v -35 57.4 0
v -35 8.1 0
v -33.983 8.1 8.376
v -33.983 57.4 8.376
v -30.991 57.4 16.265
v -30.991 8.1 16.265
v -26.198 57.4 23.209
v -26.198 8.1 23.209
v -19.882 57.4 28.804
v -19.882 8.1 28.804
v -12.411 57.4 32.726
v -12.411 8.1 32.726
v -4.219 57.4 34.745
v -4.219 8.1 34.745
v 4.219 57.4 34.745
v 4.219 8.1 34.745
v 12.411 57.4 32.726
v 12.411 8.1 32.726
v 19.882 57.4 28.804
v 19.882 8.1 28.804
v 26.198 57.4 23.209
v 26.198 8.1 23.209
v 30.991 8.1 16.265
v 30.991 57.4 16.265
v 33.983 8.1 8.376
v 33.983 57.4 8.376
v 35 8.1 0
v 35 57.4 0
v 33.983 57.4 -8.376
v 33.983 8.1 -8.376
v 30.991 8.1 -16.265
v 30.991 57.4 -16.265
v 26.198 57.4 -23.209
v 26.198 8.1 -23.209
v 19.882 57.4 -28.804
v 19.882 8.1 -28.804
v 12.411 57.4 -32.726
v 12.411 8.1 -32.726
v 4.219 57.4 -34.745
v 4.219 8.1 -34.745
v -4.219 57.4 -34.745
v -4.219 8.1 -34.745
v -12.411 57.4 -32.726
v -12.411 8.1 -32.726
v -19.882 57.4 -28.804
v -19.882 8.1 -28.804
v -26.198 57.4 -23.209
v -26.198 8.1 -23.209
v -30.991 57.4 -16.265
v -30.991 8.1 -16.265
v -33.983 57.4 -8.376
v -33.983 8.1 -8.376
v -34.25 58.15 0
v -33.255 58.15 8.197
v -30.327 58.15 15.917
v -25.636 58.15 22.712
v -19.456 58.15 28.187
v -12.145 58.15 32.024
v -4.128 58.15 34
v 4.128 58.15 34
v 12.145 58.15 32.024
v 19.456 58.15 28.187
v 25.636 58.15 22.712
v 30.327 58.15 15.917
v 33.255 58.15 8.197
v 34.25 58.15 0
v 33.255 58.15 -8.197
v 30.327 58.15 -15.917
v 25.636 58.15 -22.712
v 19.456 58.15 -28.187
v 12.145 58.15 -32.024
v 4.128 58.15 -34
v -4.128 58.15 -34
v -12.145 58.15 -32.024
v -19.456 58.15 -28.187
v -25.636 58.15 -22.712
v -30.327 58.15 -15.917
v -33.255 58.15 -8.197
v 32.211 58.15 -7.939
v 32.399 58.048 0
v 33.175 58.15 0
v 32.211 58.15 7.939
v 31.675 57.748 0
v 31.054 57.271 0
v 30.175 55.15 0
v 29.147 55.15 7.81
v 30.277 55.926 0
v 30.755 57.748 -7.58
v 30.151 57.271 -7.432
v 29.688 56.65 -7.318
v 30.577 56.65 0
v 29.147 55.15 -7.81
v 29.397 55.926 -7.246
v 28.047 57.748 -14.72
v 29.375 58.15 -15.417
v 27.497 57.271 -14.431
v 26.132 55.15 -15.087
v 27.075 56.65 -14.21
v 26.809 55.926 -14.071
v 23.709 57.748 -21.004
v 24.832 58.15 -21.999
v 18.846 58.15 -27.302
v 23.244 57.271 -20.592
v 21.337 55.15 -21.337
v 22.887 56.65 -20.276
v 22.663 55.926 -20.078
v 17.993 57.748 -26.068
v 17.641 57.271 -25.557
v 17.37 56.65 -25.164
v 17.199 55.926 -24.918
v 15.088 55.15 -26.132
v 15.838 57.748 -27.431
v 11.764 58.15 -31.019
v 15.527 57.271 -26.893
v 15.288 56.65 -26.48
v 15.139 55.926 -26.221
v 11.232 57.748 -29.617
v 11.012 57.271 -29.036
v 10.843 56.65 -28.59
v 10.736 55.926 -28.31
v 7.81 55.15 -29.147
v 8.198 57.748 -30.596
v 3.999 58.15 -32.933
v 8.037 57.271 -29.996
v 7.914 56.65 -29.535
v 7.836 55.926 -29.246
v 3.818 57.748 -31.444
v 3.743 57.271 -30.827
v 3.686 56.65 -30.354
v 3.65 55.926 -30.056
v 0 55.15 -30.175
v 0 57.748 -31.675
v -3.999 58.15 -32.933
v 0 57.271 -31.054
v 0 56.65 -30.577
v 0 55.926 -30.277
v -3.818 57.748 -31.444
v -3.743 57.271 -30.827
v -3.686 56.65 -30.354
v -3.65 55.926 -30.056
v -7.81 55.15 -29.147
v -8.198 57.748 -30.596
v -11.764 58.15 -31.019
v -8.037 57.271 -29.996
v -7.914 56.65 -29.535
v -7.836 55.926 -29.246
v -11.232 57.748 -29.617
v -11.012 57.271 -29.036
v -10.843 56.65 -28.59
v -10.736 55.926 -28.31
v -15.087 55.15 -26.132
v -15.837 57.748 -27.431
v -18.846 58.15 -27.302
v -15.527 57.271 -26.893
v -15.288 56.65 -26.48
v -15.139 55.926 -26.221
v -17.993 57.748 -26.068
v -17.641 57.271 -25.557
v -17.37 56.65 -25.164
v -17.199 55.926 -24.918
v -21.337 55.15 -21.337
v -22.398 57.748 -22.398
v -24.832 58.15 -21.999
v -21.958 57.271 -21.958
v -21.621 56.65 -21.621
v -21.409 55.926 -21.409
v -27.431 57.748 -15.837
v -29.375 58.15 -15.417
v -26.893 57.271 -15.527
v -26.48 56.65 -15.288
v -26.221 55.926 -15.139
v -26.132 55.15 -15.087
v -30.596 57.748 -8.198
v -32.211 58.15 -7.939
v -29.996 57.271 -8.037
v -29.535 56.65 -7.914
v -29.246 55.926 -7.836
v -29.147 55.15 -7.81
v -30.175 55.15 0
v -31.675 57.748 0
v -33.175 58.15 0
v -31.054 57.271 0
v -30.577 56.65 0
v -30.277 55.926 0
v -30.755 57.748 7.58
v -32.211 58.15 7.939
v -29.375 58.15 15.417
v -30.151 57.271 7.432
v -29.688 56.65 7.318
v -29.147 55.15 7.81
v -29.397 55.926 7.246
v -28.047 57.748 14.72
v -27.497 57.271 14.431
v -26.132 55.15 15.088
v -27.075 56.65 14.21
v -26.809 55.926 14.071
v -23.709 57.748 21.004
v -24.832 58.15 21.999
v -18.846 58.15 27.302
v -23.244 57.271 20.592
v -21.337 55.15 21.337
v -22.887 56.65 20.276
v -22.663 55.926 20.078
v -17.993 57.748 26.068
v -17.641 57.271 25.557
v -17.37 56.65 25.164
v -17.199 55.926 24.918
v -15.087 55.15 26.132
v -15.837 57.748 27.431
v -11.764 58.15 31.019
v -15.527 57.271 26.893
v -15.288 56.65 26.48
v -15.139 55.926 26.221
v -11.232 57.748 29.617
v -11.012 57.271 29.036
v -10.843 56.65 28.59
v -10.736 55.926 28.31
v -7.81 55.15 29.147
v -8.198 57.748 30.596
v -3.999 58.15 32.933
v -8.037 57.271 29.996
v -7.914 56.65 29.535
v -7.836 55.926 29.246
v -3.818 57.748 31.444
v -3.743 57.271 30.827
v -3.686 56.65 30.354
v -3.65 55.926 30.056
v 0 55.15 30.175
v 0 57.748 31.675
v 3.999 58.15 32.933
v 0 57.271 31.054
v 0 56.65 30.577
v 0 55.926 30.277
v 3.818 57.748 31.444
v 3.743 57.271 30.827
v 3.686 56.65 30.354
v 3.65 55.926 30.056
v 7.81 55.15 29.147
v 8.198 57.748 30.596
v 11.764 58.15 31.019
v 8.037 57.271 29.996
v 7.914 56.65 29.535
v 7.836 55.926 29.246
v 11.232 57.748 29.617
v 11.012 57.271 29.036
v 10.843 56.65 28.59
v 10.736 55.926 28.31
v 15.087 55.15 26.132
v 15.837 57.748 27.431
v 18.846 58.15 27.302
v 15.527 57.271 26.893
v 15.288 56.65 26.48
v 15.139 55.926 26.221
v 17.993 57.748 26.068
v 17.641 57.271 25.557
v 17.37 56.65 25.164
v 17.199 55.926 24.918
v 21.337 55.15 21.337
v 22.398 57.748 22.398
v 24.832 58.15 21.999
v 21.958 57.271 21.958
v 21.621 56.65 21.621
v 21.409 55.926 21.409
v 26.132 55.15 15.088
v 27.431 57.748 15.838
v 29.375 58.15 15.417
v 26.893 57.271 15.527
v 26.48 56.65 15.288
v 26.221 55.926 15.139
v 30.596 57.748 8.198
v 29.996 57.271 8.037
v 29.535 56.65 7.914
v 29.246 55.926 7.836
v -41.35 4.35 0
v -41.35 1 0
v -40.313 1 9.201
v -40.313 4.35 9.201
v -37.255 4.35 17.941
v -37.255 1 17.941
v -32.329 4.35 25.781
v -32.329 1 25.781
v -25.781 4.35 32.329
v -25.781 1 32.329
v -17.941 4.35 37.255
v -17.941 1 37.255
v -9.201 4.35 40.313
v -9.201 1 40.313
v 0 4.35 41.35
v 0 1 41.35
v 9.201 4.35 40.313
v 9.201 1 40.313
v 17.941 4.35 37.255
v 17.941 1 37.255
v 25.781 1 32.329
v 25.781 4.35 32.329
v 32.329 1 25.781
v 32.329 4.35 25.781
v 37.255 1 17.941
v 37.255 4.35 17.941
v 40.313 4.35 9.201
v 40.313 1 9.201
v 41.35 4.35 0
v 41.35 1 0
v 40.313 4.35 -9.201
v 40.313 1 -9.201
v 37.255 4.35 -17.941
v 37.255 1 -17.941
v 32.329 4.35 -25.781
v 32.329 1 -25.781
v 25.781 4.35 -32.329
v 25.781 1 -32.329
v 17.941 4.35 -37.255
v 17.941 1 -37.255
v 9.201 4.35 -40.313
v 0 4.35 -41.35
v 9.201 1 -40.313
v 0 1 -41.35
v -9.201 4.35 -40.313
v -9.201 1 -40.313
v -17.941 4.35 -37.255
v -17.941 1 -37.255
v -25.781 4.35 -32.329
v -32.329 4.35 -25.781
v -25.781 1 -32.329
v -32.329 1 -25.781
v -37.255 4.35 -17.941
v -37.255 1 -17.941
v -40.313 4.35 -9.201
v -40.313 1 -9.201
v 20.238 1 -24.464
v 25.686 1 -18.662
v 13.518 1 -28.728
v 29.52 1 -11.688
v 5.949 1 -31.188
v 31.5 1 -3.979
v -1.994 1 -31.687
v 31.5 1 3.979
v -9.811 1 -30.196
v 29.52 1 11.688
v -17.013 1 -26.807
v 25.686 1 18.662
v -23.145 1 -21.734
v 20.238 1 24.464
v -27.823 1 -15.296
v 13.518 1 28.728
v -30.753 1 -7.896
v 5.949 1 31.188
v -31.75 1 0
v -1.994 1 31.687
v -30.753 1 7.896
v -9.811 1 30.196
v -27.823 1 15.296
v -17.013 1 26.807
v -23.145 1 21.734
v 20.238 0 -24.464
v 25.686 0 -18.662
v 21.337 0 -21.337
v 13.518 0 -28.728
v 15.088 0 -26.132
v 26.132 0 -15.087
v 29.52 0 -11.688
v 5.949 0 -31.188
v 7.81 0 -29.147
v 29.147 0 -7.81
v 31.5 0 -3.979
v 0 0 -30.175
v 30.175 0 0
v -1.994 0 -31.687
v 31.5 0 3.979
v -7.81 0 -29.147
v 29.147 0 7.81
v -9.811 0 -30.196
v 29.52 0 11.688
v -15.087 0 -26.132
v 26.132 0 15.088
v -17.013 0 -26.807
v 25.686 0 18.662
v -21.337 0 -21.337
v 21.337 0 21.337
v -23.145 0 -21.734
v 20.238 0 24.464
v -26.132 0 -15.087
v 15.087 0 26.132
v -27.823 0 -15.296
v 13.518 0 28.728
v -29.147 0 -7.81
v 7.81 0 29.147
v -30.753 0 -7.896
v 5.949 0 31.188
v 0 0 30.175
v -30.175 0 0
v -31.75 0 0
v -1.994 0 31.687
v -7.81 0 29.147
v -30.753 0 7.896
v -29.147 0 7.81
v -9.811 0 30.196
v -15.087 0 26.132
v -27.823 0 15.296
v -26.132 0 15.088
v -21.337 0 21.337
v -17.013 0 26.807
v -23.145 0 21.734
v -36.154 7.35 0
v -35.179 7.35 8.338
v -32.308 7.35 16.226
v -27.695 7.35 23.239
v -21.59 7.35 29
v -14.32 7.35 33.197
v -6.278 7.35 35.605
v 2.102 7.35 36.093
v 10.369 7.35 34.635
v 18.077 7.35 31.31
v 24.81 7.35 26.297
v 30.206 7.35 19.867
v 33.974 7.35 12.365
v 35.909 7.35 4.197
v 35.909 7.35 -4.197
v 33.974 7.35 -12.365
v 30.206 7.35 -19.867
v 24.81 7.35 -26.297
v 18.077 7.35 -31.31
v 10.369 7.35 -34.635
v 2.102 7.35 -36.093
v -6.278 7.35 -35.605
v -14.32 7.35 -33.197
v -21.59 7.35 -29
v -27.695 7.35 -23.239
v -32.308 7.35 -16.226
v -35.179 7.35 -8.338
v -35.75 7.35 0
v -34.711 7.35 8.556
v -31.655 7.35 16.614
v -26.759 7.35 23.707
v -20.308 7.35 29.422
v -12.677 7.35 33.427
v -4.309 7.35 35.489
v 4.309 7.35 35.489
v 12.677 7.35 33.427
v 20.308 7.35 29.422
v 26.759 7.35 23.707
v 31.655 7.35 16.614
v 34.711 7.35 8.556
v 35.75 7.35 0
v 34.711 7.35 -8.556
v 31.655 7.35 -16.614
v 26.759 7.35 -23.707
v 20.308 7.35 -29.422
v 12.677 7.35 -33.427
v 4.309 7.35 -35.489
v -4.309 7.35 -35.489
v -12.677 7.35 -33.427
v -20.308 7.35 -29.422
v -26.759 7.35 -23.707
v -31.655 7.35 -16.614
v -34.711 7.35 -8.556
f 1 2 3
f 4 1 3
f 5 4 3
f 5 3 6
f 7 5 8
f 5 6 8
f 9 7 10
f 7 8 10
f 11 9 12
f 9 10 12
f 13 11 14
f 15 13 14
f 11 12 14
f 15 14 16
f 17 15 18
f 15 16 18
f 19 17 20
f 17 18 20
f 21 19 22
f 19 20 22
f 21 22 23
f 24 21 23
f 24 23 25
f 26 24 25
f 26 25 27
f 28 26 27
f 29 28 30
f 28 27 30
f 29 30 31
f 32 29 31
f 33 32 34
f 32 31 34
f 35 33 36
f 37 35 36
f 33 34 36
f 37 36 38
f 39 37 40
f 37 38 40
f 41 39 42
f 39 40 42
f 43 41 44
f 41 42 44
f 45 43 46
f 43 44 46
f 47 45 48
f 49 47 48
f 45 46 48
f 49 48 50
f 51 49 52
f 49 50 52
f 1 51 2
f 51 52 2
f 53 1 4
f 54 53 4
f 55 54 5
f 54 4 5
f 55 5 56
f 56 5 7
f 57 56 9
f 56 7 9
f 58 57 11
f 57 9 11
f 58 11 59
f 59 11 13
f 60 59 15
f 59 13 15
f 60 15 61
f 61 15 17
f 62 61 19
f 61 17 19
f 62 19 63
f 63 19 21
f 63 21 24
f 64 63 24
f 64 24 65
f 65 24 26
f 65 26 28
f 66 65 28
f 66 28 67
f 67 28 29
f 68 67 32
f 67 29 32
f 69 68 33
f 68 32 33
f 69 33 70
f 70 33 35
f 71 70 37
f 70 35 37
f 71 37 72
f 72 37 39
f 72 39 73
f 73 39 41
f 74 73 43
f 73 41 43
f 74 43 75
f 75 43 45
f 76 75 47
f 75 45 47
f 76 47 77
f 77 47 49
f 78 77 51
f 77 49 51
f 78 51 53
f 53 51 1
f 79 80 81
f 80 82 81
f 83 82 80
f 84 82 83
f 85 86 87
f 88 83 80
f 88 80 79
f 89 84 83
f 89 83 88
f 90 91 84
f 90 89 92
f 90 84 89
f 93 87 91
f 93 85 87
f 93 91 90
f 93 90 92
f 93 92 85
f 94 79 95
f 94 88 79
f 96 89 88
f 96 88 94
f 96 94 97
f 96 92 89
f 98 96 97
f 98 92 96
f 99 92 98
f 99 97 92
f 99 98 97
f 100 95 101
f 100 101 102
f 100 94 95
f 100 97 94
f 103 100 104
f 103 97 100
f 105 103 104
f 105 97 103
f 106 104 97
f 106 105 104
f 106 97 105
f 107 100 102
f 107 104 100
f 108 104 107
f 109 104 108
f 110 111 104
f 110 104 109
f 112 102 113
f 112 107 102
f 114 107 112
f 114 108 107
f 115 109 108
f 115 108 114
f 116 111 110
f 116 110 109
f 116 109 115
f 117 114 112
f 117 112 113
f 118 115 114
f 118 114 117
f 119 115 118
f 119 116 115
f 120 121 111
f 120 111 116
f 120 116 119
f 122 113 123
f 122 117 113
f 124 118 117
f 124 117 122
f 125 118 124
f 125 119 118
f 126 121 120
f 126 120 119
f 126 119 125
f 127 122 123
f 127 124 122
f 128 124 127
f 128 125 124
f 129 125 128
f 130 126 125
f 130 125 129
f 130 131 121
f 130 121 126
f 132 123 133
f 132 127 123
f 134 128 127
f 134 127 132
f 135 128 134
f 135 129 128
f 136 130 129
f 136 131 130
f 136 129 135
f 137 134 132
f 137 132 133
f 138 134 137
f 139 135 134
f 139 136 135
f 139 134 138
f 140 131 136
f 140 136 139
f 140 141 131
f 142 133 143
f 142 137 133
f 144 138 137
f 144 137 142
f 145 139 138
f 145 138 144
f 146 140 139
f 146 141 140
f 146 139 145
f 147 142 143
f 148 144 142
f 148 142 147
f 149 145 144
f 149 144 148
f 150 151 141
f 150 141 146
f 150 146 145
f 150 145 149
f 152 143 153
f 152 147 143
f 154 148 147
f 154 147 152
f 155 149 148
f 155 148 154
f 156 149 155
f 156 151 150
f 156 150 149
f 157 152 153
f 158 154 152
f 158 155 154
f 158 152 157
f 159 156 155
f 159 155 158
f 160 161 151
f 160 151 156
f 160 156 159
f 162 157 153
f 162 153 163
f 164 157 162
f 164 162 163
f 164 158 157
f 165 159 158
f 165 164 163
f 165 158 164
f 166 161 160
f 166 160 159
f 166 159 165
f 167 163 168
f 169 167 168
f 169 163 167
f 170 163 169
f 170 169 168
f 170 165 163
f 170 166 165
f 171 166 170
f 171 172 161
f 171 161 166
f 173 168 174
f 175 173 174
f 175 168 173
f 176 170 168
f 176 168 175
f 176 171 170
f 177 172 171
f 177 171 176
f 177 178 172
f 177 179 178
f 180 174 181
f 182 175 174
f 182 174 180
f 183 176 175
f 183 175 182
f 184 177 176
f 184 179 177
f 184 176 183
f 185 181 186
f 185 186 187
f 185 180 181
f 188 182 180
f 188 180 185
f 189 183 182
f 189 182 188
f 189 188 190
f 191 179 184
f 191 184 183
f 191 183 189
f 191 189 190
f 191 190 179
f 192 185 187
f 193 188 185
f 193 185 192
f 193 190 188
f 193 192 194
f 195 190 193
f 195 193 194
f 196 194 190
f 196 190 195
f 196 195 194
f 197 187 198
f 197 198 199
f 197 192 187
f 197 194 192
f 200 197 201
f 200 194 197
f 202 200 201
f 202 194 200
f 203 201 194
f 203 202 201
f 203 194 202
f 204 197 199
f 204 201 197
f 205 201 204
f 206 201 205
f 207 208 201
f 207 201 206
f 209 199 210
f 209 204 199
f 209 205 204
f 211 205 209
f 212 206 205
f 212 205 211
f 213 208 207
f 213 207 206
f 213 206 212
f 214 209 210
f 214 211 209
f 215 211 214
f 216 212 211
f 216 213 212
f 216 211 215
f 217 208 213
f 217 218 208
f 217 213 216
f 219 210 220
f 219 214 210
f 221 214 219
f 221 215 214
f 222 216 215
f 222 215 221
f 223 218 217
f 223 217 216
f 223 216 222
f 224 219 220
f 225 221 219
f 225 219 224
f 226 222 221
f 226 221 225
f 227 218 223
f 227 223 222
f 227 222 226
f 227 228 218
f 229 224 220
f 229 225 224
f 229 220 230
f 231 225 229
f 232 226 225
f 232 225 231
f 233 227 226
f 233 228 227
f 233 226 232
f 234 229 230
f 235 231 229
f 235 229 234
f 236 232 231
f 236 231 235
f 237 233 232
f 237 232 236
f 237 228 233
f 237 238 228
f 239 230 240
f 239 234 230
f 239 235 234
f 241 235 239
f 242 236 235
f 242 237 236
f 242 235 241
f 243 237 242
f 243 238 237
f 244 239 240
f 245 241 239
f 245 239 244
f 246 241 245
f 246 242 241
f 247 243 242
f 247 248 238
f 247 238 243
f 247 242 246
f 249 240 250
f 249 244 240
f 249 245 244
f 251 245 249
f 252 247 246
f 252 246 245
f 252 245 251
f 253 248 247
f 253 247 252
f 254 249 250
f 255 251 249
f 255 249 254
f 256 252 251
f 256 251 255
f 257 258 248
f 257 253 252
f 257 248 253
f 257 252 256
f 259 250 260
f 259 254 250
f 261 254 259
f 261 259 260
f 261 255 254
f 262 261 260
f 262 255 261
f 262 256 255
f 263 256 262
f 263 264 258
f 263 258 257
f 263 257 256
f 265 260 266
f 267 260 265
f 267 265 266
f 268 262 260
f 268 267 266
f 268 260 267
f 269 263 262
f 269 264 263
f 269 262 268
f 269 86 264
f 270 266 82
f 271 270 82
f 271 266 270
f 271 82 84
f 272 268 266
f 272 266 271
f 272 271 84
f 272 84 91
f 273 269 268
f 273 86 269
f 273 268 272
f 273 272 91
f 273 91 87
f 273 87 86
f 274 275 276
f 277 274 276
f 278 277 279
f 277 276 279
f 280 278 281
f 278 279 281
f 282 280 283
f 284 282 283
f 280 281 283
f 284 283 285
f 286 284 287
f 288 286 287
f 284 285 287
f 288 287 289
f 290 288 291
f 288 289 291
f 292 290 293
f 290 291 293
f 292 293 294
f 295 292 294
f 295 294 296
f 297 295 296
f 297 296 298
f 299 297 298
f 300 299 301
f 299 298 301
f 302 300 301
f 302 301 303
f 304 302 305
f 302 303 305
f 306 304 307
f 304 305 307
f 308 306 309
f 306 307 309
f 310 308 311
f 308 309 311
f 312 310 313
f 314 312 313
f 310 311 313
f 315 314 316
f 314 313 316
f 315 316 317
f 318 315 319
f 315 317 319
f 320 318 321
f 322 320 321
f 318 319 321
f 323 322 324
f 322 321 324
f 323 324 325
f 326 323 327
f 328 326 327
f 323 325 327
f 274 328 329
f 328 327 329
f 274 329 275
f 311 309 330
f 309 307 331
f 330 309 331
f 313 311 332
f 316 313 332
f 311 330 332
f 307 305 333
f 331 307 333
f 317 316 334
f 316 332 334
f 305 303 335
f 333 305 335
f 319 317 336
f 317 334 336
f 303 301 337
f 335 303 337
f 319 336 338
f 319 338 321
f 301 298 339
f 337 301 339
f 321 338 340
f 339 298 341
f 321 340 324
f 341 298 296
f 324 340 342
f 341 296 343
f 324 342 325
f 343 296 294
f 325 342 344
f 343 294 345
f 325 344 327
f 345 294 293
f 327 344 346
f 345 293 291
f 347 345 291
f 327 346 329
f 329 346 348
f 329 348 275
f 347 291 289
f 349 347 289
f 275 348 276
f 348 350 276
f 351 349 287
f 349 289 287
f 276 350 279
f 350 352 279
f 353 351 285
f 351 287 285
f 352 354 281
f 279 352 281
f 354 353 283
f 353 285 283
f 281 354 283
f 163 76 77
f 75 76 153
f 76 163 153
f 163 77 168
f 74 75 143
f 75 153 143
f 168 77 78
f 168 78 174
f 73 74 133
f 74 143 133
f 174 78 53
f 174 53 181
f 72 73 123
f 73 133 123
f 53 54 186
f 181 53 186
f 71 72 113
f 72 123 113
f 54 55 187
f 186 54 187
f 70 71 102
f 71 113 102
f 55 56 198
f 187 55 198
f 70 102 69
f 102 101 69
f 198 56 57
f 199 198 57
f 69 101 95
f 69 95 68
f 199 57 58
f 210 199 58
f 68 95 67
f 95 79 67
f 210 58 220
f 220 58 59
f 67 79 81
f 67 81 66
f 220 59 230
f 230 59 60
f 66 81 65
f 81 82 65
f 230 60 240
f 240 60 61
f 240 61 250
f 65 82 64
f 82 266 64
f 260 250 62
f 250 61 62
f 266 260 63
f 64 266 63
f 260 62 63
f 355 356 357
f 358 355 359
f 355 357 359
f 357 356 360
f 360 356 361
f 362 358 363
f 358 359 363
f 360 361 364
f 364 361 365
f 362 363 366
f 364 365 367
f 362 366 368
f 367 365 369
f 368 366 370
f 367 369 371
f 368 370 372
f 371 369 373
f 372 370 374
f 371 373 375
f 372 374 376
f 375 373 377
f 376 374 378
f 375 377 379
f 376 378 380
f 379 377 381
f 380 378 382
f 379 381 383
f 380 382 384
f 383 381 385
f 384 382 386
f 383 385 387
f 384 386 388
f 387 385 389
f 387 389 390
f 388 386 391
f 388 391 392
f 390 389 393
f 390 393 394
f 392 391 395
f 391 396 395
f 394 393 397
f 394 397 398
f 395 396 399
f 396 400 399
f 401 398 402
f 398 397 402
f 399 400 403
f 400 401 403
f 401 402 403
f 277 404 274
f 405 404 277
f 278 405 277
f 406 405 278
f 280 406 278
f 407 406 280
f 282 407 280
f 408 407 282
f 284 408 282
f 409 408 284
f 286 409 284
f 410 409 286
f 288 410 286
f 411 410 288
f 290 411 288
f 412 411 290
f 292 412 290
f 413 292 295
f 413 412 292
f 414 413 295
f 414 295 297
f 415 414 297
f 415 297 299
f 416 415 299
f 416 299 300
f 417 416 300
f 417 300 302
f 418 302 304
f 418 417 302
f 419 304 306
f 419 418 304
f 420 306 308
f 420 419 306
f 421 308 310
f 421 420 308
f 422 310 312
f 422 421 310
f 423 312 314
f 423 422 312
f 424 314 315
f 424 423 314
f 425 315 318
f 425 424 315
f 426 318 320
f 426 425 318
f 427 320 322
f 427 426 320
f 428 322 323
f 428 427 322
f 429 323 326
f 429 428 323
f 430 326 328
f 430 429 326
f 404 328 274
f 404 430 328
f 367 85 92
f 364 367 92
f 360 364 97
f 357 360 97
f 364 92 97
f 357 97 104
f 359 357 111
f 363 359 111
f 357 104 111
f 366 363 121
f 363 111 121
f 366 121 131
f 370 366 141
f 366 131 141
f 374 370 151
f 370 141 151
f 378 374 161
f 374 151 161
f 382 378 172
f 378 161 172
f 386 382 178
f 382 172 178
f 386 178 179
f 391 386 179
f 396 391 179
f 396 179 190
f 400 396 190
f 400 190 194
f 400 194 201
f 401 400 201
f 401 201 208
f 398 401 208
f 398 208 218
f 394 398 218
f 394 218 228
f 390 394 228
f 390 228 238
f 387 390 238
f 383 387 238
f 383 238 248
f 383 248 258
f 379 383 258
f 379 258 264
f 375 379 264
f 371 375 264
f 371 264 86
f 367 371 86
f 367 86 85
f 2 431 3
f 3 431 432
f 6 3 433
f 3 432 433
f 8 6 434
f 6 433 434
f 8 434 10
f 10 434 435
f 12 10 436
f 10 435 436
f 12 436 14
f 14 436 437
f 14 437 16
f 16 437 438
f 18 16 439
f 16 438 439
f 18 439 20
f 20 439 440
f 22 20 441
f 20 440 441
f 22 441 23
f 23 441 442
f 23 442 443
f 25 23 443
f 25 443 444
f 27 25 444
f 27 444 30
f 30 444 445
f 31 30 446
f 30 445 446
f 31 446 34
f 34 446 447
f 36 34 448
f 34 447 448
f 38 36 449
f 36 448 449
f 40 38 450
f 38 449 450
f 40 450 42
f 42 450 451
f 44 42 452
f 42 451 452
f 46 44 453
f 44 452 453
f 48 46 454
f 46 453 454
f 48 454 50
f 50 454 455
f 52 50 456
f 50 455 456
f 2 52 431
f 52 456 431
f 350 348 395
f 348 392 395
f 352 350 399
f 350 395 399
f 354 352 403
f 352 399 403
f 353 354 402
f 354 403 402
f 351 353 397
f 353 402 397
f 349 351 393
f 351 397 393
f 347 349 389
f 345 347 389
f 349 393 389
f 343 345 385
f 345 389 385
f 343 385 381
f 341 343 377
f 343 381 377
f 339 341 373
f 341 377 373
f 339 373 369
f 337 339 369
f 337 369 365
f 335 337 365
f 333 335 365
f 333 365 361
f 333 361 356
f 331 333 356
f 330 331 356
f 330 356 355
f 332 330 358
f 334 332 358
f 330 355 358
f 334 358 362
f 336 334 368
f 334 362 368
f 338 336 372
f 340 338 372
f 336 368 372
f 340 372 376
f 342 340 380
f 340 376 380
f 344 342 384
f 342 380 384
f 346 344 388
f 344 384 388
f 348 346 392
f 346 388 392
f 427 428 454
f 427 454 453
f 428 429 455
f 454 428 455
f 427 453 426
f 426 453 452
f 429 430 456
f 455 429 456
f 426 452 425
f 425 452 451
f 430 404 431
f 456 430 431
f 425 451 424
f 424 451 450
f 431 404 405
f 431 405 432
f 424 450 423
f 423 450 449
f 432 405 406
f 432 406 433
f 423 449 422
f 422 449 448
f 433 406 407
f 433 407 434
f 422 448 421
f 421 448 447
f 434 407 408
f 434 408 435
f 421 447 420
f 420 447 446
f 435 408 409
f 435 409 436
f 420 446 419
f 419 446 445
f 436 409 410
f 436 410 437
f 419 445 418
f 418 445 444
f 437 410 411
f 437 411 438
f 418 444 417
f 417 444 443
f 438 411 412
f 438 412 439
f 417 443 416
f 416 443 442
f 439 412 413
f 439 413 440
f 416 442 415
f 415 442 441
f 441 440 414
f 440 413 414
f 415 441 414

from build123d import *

# Parameters (mm, degrees)
SKETCH3_R          = 30.175
CUT_EXTRUDE1_DEPTH = 59.15
CHAMFER1_SIZE      = 0.75
CHAMFER2_SIZE      = 3
CHAMFER2_SIZE2     = 5.196152423
FILLET1_R          = 3


with BuildPart() as part:
    # Sketch2 → Revolve1 (revolve)
    with BuildSketch(Plane.XY):
        Polygon((0, 0), (0, 58.15), (-35, 58.15), (-35, 7.35), (-41.35, 7.35), (-41.35, 1), (-31.75, 1), (-31.75, 0), align=None)
    revolve(axis=Axis((0, 0, 0), (0, 1, 0)))

    # Sketch3 → Cut-Extrude1 (cut, through all)
    with BuildSketch(Plane(origin=(0, 58.15, 0), x_dir=(1, 0, 0), z_dir=(0, 1, 0))):
        Circle(SKETCH3_R)
    extrude(amount=-CUT_EXTRUDE1_DEPTH, mode=Mode.SUBTRACT)

    # Chamfer1
    chamfer1_edges = [part.edges().sort_by_distance(p)[0] for p in [
        (35, 7.35, 0),
        (35, 58.15, 0),
    ]]
    chamfer(chamfer1_edges, length=CHAMFER1_SIZE)

    # Chamfer2
    chamfer2_edges = [part.edges().sort_by_distance(p)[0] for p in [
        (41.35, 7.35, 0),
    ]]
    chamfer2_side = [part.faces().sort_by_distance(p)[0] for p in [
        (41.35, 4.175, 0),
    ]]
    chamfer(chamfer2_edges, length=CHAMFER2_SIZE, length2=CHAMFER2_SIZE2, reference=chamfer2_side[0])

    # Fillet1
    fillet1_edges = [part.edges().sort_by_distance(p)[0] for p in [
        (-30.175, 58.15, 0),
    ]]
    fillet(fillet1_edges, radius=FILLET1_R)


solid = part.part
